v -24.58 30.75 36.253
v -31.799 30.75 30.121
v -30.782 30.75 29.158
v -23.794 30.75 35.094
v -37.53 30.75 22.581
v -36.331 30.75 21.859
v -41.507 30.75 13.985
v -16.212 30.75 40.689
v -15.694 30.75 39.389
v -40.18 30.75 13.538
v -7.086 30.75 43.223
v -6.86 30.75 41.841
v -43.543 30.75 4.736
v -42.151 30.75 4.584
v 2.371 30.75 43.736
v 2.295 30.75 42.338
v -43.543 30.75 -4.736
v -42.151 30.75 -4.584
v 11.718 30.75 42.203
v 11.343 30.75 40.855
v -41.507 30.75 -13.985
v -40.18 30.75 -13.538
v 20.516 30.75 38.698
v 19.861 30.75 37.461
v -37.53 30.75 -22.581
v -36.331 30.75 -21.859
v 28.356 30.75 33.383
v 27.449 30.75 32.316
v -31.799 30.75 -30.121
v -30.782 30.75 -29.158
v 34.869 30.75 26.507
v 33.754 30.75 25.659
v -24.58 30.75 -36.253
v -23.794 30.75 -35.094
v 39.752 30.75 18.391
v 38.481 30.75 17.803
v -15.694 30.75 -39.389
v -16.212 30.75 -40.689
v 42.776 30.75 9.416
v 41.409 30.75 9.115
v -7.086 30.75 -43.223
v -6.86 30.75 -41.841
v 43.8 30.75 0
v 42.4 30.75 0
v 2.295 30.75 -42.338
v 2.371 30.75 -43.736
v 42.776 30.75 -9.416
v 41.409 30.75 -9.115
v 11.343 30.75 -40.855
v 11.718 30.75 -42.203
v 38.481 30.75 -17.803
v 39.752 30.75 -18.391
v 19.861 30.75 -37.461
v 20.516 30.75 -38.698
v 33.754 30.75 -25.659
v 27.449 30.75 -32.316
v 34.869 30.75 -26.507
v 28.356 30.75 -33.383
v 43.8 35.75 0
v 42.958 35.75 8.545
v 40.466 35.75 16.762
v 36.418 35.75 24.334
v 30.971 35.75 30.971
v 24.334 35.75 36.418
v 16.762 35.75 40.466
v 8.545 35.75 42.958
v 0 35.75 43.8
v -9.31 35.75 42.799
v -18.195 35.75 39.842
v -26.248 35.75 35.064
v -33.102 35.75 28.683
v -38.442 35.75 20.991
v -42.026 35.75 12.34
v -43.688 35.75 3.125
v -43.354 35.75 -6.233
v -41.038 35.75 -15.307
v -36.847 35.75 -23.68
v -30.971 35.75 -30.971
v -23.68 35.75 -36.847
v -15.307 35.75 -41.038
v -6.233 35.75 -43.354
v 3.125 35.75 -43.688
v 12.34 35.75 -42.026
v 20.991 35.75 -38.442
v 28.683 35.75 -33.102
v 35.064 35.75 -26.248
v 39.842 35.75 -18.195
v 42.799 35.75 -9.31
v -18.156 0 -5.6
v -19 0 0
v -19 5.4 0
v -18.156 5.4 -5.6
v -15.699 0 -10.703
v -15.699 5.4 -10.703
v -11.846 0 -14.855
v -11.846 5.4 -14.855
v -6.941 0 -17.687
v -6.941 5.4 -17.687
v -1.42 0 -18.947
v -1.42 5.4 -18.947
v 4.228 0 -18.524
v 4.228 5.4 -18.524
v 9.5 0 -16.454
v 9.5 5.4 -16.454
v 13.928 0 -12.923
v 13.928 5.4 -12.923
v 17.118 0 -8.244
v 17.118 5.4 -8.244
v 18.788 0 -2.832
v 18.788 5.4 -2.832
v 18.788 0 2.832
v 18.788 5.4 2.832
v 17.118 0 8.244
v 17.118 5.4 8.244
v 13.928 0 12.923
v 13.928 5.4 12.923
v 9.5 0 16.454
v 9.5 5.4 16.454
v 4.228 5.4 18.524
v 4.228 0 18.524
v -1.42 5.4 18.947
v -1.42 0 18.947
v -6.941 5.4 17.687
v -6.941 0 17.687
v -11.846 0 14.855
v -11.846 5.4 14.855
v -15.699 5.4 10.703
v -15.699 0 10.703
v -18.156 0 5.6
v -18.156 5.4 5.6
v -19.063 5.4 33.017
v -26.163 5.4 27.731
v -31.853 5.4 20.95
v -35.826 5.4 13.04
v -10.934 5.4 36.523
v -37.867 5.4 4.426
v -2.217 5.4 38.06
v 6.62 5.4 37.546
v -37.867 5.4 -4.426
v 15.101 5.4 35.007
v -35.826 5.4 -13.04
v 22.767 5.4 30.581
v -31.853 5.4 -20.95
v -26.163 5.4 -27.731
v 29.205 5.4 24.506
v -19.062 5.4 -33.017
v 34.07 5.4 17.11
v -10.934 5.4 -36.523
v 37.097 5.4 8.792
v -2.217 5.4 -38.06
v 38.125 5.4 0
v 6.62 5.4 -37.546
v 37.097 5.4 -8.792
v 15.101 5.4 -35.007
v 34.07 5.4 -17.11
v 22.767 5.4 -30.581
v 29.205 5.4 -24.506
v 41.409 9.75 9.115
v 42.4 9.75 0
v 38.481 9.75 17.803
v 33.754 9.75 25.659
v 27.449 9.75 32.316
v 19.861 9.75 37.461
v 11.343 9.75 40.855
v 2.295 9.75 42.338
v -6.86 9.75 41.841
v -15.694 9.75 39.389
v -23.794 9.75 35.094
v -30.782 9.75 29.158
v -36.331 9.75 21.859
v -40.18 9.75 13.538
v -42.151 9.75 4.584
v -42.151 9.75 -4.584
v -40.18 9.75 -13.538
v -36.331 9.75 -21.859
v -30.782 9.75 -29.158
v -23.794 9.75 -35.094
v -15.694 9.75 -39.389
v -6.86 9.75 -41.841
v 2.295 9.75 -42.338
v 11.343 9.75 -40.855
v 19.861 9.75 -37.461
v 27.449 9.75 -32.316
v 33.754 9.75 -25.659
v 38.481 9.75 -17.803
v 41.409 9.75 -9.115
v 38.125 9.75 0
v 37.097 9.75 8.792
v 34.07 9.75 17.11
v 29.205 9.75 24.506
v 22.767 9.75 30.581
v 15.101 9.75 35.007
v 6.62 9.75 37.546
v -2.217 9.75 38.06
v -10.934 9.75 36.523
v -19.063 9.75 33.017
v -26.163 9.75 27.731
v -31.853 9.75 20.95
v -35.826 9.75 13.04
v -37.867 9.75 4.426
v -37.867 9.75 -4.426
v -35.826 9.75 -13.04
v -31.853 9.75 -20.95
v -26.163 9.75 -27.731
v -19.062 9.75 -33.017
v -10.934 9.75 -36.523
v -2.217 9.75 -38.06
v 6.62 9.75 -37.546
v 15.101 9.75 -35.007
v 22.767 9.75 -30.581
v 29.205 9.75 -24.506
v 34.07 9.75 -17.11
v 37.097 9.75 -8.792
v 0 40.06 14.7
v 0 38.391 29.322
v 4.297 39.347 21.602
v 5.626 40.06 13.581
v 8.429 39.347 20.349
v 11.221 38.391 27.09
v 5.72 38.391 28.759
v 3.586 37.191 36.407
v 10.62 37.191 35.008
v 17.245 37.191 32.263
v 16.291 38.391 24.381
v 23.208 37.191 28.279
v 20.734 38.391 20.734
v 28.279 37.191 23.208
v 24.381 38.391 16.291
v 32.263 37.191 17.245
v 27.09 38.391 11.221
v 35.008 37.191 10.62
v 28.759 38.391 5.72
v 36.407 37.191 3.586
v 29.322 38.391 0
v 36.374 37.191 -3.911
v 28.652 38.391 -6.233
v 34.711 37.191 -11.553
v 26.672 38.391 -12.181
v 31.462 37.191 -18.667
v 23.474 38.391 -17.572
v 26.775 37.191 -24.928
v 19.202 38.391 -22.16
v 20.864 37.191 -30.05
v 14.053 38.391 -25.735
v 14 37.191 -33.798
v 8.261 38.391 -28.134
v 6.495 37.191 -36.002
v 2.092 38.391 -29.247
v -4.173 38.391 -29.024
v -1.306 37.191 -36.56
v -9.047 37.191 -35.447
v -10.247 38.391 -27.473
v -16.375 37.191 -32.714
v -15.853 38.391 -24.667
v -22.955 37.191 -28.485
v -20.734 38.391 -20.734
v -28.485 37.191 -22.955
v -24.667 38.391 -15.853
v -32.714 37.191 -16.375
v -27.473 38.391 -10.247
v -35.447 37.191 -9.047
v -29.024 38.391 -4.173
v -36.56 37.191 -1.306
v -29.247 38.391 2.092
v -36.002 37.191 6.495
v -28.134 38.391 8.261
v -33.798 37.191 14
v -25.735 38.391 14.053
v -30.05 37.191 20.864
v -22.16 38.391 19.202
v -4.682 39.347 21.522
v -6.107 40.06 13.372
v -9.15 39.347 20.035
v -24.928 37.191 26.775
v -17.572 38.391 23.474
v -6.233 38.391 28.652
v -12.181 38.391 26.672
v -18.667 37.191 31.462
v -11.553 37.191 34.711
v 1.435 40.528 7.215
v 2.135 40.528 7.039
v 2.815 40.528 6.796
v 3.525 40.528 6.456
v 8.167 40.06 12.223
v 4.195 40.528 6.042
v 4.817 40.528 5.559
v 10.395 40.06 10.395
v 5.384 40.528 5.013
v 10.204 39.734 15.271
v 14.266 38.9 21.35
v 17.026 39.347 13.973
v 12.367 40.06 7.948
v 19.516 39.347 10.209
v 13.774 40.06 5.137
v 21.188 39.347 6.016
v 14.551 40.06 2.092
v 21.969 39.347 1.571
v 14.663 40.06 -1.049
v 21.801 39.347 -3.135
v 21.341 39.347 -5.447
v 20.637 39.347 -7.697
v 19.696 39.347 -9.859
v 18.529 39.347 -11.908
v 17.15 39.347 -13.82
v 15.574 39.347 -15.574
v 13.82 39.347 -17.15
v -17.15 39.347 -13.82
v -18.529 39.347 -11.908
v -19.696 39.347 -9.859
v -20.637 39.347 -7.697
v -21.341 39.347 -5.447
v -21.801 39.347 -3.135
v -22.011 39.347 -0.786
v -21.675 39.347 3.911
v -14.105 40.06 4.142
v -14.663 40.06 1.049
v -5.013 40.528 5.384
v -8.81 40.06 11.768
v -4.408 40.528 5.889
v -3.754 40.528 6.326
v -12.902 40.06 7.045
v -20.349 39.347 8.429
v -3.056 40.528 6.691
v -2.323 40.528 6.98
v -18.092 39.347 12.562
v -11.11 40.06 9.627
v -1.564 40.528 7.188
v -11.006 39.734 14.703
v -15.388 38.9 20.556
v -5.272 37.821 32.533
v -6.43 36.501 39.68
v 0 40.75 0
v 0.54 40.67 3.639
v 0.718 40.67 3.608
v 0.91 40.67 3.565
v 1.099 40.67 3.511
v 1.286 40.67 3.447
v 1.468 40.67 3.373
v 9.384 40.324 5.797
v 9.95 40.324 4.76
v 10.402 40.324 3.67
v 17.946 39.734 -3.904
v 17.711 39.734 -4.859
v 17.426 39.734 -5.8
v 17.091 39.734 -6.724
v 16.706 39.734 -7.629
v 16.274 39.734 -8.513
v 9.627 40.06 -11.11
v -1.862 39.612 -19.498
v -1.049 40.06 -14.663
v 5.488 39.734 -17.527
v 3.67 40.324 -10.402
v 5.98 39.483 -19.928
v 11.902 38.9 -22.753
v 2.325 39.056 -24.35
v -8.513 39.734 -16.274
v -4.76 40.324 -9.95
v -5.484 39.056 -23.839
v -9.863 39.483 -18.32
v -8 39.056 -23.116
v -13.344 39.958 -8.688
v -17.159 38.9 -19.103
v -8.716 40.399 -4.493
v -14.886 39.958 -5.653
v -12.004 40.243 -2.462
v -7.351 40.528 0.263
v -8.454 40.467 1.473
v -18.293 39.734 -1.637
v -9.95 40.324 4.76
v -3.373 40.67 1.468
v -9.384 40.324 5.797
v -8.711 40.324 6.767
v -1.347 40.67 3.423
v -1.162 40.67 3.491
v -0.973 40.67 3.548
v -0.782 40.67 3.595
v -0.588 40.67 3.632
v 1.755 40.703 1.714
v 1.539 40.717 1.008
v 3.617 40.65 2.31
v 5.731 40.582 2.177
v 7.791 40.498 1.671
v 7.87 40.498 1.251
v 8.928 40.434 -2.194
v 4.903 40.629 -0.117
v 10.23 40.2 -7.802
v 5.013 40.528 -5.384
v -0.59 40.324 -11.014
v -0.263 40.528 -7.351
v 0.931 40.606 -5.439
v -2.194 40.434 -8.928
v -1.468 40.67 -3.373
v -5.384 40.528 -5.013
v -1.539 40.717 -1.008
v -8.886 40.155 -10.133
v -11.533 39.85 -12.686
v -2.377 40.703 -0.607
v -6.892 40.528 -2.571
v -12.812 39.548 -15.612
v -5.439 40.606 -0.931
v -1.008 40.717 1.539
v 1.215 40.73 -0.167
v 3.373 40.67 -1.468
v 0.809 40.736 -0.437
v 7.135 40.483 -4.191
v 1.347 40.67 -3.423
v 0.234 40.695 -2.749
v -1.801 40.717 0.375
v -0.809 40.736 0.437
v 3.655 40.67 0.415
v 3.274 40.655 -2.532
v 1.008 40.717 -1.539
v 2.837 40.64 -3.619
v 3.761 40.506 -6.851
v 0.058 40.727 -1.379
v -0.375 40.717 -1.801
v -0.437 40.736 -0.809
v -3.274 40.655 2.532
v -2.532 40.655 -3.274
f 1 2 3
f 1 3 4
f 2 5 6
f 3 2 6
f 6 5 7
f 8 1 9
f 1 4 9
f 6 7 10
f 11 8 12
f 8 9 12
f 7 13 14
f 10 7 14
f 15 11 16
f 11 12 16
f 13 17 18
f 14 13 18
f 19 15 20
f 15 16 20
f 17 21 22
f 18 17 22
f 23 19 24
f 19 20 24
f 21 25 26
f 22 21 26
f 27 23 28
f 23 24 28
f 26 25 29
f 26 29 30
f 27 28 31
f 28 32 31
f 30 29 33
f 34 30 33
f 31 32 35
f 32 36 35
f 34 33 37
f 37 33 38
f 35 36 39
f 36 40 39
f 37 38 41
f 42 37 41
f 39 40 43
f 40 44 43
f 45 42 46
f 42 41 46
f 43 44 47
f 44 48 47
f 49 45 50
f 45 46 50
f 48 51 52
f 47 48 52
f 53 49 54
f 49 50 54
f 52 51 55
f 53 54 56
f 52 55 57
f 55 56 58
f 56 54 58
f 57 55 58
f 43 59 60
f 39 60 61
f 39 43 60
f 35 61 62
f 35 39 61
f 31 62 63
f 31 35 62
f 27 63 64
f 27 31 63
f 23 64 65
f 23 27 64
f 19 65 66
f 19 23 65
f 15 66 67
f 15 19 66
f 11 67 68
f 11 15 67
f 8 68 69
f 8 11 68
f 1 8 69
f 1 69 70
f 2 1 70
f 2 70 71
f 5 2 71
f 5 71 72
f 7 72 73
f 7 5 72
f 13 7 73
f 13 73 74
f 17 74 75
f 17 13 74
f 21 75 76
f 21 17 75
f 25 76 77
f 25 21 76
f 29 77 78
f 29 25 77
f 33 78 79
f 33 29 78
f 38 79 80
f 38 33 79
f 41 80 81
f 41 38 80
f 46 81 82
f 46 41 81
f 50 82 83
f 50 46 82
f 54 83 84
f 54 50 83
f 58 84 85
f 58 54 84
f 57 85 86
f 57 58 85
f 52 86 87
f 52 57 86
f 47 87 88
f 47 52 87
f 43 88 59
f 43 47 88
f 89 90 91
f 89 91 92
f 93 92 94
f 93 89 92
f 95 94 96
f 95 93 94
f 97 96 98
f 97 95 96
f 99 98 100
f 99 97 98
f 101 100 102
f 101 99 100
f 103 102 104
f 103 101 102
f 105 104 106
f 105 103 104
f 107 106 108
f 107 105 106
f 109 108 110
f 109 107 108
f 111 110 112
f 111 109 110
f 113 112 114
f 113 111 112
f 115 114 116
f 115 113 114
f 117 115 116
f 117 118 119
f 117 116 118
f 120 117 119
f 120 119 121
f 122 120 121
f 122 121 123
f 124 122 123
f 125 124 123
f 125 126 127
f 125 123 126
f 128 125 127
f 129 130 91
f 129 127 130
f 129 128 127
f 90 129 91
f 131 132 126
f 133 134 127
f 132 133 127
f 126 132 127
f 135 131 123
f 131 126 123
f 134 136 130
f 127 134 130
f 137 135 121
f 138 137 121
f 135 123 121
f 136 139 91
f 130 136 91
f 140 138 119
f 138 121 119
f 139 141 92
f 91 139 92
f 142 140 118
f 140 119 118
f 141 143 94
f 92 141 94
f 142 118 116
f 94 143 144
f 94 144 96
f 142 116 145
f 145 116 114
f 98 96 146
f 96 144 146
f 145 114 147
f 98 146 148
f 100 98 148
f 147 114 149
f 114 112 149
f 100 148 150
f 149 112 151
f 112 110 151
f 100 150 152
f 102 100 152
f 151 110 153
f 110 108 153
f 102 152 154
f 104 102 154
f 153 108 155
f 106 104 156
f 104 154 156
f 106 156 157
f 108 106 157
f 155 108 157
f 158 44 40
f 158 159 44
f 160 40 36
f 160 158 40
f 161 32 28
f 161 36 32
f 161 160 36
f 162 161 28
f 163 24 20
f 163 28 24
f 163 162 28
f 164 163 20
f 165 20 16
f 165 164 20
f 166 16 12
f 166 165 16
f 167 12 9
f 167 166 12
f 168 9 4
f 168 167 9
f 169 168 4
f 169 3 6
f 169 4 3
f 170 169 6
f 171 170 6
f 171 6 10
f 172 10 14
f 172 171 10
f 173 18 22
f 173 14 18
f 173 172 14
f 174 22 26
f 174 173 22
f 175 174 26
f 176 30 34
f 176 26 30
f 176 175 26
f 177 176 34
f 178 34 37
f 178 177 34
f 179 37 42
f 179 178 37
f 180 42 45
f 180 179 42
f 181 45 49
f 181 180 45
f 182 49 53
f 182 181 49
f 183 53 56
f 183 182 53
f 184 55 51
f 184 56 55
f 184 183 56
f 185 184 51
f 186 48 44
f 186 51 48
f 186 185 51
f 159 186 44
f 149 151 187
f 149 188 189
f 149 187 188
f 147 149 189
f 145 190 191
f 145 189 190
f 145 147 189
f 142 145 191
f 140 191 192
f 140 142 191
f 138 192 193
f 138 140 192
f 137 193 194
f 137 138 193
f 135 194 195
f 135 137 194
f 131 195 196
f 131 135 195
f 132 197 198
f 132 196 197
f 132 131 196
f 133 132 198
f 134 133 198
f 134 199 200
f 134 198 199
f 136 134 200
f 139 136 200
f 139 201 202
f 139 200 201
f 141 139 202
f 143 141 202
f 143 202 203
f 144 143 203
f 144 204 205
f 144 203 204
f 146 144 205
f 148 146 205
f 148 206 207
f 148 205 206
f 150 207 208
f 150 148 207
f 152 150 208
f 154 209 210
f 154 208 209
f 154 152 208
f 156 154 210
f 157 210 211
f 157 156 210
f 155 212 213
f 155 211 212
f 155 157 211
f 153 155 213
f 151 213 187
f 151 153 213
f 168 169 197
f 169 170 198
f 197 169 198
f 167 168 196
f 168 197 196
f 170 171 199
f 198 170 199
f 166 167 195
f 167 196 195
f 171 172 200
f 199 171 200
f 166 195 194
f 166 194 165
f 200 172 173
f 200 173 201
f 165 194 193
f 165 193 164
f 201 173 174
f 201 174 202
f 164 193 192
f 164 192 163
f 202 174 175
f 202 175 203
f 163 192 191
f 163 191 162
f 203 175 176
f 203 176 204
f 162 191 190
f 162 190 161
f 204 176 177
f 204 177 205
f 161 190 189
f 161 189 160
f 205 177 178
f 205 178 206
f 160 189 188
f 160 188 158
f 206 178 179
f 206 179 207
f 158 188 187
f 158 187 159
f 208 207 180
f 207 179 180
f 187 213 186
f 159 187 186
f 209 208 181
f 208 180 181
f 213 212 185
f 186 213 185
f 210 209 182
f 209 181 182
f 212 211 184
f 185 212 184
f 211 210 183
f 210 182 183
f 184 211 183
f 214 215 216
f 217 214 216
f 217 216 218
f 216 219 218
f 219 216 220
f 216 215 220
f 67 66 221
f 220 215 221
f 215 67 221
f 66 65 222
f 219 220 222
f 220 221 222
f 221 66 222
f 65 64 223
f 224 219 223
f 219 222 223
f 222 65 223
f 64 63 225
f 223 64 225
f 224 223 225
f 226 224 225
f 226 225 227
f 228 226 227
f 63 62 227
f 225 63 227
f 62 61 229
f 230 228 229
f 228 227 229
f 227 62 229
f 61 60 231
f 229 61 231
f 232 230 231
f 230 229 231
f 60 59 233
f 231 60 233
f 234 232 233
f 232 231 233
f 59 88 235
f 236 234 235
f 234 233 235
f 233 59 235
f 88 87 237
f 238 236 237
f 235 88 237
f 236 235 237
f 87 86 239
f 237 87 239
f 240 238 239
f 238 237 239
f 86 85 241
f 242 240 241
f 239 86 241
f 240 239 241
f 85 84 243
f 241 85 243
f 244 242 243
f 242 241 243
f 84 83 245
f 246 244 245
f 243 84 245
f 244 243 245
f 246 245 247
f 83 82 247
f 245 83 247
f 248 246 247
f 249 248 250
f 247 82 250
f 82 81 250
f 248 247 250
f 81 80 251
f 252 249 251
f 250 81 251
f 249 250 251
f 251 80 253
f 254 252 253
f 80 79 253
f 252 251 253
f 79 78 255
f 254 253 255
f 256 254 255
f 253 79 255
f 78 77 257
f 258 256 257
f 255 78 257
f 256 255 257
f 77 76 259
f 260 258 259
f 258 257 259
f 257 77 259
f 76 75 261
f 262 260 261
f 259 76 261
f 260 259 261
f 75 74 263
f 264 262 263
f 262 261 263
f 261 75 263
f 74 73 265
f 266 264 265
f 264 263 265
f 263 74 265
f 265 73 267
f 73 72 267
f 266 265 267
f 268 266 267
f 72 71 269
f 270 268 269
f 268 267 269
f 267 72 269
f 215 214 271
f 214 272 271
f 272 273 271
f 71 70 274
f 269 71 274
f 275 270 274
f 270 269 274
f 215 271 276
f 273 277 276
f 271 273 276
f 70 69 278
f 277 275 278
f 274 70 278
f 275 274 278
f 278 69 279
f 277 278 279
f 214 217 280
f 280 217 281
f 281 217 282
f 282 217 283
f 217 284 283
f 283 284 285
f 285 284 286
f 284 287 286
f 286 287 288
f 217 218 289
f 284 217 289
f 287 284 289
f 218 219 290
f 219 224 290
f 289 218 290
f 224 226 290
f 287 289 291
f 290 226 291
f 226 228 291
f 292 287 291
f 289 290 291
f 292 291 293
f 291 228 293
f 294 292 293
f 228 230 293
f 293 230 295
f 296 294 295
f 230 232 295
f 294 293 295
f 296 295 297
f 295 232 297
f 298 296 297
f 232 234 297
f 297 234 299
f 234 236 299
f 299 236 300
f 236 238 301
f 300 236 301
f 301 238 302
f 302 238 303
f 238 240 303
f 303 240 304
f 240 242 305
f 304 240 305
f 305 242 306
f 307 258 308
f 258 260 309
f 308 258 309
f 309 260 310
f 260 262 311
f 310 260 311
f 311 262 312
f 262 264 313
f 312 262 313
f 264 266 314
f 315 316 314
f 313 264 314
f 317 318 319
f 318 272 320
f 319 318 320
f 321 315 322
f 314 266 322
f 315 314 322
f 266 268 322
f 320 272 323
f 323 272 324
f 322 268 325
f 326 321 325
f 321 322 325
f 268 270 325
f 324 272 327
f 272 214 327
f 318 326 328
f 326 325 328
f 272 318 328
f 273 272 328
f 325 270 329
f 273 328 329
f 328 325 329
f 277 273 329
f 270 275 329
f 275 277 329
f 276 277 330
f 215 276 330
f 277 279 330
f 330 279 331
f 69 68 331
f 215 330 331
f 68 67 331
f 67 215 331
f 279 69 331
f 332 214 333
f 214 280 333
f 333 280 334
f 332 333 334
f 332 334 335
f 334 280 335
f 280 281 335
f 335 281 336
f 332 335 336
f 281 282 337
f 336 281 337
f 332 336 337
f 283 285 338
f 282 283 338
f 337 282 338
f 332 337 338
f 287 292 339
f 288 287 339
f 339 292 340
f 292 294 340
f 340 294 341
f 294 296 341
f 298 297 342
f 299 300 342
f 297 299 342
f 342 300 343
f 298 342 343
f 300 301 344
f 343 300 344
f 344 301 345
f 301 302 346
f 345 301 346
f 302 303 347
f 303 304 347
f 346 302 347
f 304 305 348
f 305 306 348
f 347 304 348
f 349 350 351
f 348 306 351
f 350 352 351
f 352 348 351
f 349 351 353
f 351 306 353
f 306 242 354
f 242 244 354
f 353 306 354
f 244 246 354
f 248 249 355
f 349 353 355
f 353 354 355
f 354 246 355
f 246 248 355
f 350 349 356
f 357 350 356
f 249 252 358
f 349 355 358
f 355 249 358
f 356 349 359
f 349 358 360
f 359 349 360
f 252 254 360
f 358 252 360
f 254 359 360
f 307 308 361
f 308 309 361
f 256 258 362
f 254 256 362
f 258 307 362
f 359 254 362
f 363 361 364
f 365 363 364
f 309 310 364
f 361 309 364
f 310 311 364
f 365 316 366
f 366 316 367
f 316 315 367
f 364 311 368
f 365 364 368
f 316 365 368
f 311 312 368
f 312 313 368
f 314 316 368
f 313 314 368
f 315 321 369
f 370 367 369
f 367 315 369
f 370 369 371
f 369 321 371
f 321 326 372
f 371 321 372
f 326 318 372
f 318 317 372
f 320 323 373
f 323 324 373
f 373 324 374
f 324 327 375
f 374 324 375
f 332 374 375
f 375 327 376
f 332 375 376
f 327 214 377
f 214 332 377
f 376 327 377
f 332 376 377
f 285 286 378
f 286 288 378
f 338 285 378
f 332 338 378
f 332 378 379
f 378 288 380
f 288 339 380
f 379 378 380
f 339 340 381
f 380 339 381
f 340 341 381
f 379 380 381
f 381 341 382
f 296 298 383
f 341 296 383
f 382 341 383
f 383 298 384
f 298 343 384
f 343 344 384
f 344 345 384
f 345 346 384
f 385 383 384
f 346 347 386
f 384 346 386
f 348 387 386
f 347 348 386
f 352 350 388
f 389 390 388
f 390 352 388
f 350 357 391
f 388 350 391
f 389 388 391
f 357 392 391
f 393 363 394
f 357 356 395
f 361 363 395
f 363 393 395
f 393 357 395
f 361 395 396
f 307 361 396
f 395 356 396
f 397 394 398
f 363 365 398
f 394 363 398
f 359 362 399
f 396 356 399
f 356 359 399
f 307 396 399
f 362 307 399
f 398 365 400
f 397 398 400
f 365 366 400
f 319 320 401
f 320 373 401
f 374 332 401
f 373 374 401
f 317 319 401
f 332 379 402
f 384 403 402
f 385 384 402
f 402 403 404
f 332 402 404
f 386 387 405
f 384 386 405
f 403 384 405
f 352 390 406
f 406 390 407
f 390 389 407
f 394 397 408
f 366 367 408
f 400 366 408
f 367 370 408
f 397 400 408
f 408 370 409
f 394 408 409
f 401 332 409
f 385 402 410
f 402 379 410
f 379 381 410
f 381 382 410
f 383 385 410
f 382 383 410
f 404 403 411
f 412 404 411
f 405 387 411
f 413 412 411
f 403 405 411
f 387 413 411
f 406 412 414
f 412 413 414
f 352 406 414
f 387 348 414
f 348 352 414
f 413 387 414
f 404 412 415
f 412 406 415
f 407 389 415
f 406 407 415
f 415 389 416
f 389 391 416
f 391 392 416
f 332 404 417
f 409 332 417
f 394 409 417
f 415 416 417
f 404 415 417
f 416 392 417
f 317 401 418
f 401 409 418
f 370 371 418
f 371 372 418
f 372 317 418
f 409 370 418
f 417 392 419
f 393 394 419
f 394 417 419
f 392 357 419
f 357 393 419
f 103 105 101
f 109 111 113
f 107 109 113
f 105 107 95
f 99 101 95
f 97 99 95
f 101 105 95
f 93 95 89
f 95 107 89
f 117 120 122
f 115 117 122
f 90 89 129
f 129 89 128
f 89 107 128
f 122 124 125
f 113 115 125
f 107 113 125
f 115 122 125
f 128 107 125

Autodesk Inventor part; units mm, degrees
ref_plane "YZ Plane" through (0, 0, 0) normal (1, 0, 0) x (0, 1, 0)
ref_plane "XZ Plane" through (0, 0, 0) normal (0, 1, 0) x (-1, 0, 0)
ref_plane "XY Plane" through (0, 0, 0) normal (0, 0, 1) x (1, 0, 0)
sketch "Sketch1" plane through (0, 0, 0) normal (0, 1, 0) x (-1, 0, 0)
  circle A0 centre (0, 0) radius 19
  dimension "d0" = 38
extrude "Extrusion1" add sketch "Sketch1" along normal blind 5.4
sketch "Sketch2" plane through (0, 5.4, 0) normal (0, 1, 0) x (1, 0, 0)
  circle A0 centre (0, 0) radius 38.125
  dimension "d3" = 76.25
extrude "Extrusion2" add sketch "Sketch2" along normal blind 4.35
sketch "Sketch3" plane through (0, 9.75, 0) normal (0, 1, 0) x (1, 0, 0)
  circle A0 centre (0, 0) radius 42.4
  dimension "d6" = 84.8
extrude "Extrusion3" add sketch "Sketch3" along normal blind 21
sketch "Sketch4" plane through (0, 30.75, 0) normal (0, 1, 0) x (1, 0, 0)
  circle A0 centre (0, 0) radius 43.8
  dimension "d9" = 87.6
extrude "Extrusion4" add sketch "Sketch4" along normal blind 5
sketch "Sketch5" plane through (0, 0, 0) normal (1, 0, 0) x (0, 1, 0)
  line L0 (35.75, -43.8) -> (35.75, 43.8) projected
  line L1 (35.75, -43.8) -> (35.75, 43.8) projected
  line L2 (30.75, -43.8) -> (30.75, 43.8) projected
  line L3 (35.75, -43.8) -> (35.75, 43.8) projected
  line L4 (30.75, -43.8) -> (30.75, 43.8) projected
  line L5 (35.75, 0) -> (40.75, 0)
  arc A0 (40.75, 0) -> (35.75, 43.8) centre (-179.7193, -2.9823) ccw
  line L6 (35.75, 0) -> (35.75, 43.8)
  point P0 (0, 0)
  dimension "d12" = 5
revolve "Revolution1" add sketch "Sketch5" angle 360 about axis through (0, 35.75, 0) along (0, 1, 0)
properties part number "N95 Filter"
